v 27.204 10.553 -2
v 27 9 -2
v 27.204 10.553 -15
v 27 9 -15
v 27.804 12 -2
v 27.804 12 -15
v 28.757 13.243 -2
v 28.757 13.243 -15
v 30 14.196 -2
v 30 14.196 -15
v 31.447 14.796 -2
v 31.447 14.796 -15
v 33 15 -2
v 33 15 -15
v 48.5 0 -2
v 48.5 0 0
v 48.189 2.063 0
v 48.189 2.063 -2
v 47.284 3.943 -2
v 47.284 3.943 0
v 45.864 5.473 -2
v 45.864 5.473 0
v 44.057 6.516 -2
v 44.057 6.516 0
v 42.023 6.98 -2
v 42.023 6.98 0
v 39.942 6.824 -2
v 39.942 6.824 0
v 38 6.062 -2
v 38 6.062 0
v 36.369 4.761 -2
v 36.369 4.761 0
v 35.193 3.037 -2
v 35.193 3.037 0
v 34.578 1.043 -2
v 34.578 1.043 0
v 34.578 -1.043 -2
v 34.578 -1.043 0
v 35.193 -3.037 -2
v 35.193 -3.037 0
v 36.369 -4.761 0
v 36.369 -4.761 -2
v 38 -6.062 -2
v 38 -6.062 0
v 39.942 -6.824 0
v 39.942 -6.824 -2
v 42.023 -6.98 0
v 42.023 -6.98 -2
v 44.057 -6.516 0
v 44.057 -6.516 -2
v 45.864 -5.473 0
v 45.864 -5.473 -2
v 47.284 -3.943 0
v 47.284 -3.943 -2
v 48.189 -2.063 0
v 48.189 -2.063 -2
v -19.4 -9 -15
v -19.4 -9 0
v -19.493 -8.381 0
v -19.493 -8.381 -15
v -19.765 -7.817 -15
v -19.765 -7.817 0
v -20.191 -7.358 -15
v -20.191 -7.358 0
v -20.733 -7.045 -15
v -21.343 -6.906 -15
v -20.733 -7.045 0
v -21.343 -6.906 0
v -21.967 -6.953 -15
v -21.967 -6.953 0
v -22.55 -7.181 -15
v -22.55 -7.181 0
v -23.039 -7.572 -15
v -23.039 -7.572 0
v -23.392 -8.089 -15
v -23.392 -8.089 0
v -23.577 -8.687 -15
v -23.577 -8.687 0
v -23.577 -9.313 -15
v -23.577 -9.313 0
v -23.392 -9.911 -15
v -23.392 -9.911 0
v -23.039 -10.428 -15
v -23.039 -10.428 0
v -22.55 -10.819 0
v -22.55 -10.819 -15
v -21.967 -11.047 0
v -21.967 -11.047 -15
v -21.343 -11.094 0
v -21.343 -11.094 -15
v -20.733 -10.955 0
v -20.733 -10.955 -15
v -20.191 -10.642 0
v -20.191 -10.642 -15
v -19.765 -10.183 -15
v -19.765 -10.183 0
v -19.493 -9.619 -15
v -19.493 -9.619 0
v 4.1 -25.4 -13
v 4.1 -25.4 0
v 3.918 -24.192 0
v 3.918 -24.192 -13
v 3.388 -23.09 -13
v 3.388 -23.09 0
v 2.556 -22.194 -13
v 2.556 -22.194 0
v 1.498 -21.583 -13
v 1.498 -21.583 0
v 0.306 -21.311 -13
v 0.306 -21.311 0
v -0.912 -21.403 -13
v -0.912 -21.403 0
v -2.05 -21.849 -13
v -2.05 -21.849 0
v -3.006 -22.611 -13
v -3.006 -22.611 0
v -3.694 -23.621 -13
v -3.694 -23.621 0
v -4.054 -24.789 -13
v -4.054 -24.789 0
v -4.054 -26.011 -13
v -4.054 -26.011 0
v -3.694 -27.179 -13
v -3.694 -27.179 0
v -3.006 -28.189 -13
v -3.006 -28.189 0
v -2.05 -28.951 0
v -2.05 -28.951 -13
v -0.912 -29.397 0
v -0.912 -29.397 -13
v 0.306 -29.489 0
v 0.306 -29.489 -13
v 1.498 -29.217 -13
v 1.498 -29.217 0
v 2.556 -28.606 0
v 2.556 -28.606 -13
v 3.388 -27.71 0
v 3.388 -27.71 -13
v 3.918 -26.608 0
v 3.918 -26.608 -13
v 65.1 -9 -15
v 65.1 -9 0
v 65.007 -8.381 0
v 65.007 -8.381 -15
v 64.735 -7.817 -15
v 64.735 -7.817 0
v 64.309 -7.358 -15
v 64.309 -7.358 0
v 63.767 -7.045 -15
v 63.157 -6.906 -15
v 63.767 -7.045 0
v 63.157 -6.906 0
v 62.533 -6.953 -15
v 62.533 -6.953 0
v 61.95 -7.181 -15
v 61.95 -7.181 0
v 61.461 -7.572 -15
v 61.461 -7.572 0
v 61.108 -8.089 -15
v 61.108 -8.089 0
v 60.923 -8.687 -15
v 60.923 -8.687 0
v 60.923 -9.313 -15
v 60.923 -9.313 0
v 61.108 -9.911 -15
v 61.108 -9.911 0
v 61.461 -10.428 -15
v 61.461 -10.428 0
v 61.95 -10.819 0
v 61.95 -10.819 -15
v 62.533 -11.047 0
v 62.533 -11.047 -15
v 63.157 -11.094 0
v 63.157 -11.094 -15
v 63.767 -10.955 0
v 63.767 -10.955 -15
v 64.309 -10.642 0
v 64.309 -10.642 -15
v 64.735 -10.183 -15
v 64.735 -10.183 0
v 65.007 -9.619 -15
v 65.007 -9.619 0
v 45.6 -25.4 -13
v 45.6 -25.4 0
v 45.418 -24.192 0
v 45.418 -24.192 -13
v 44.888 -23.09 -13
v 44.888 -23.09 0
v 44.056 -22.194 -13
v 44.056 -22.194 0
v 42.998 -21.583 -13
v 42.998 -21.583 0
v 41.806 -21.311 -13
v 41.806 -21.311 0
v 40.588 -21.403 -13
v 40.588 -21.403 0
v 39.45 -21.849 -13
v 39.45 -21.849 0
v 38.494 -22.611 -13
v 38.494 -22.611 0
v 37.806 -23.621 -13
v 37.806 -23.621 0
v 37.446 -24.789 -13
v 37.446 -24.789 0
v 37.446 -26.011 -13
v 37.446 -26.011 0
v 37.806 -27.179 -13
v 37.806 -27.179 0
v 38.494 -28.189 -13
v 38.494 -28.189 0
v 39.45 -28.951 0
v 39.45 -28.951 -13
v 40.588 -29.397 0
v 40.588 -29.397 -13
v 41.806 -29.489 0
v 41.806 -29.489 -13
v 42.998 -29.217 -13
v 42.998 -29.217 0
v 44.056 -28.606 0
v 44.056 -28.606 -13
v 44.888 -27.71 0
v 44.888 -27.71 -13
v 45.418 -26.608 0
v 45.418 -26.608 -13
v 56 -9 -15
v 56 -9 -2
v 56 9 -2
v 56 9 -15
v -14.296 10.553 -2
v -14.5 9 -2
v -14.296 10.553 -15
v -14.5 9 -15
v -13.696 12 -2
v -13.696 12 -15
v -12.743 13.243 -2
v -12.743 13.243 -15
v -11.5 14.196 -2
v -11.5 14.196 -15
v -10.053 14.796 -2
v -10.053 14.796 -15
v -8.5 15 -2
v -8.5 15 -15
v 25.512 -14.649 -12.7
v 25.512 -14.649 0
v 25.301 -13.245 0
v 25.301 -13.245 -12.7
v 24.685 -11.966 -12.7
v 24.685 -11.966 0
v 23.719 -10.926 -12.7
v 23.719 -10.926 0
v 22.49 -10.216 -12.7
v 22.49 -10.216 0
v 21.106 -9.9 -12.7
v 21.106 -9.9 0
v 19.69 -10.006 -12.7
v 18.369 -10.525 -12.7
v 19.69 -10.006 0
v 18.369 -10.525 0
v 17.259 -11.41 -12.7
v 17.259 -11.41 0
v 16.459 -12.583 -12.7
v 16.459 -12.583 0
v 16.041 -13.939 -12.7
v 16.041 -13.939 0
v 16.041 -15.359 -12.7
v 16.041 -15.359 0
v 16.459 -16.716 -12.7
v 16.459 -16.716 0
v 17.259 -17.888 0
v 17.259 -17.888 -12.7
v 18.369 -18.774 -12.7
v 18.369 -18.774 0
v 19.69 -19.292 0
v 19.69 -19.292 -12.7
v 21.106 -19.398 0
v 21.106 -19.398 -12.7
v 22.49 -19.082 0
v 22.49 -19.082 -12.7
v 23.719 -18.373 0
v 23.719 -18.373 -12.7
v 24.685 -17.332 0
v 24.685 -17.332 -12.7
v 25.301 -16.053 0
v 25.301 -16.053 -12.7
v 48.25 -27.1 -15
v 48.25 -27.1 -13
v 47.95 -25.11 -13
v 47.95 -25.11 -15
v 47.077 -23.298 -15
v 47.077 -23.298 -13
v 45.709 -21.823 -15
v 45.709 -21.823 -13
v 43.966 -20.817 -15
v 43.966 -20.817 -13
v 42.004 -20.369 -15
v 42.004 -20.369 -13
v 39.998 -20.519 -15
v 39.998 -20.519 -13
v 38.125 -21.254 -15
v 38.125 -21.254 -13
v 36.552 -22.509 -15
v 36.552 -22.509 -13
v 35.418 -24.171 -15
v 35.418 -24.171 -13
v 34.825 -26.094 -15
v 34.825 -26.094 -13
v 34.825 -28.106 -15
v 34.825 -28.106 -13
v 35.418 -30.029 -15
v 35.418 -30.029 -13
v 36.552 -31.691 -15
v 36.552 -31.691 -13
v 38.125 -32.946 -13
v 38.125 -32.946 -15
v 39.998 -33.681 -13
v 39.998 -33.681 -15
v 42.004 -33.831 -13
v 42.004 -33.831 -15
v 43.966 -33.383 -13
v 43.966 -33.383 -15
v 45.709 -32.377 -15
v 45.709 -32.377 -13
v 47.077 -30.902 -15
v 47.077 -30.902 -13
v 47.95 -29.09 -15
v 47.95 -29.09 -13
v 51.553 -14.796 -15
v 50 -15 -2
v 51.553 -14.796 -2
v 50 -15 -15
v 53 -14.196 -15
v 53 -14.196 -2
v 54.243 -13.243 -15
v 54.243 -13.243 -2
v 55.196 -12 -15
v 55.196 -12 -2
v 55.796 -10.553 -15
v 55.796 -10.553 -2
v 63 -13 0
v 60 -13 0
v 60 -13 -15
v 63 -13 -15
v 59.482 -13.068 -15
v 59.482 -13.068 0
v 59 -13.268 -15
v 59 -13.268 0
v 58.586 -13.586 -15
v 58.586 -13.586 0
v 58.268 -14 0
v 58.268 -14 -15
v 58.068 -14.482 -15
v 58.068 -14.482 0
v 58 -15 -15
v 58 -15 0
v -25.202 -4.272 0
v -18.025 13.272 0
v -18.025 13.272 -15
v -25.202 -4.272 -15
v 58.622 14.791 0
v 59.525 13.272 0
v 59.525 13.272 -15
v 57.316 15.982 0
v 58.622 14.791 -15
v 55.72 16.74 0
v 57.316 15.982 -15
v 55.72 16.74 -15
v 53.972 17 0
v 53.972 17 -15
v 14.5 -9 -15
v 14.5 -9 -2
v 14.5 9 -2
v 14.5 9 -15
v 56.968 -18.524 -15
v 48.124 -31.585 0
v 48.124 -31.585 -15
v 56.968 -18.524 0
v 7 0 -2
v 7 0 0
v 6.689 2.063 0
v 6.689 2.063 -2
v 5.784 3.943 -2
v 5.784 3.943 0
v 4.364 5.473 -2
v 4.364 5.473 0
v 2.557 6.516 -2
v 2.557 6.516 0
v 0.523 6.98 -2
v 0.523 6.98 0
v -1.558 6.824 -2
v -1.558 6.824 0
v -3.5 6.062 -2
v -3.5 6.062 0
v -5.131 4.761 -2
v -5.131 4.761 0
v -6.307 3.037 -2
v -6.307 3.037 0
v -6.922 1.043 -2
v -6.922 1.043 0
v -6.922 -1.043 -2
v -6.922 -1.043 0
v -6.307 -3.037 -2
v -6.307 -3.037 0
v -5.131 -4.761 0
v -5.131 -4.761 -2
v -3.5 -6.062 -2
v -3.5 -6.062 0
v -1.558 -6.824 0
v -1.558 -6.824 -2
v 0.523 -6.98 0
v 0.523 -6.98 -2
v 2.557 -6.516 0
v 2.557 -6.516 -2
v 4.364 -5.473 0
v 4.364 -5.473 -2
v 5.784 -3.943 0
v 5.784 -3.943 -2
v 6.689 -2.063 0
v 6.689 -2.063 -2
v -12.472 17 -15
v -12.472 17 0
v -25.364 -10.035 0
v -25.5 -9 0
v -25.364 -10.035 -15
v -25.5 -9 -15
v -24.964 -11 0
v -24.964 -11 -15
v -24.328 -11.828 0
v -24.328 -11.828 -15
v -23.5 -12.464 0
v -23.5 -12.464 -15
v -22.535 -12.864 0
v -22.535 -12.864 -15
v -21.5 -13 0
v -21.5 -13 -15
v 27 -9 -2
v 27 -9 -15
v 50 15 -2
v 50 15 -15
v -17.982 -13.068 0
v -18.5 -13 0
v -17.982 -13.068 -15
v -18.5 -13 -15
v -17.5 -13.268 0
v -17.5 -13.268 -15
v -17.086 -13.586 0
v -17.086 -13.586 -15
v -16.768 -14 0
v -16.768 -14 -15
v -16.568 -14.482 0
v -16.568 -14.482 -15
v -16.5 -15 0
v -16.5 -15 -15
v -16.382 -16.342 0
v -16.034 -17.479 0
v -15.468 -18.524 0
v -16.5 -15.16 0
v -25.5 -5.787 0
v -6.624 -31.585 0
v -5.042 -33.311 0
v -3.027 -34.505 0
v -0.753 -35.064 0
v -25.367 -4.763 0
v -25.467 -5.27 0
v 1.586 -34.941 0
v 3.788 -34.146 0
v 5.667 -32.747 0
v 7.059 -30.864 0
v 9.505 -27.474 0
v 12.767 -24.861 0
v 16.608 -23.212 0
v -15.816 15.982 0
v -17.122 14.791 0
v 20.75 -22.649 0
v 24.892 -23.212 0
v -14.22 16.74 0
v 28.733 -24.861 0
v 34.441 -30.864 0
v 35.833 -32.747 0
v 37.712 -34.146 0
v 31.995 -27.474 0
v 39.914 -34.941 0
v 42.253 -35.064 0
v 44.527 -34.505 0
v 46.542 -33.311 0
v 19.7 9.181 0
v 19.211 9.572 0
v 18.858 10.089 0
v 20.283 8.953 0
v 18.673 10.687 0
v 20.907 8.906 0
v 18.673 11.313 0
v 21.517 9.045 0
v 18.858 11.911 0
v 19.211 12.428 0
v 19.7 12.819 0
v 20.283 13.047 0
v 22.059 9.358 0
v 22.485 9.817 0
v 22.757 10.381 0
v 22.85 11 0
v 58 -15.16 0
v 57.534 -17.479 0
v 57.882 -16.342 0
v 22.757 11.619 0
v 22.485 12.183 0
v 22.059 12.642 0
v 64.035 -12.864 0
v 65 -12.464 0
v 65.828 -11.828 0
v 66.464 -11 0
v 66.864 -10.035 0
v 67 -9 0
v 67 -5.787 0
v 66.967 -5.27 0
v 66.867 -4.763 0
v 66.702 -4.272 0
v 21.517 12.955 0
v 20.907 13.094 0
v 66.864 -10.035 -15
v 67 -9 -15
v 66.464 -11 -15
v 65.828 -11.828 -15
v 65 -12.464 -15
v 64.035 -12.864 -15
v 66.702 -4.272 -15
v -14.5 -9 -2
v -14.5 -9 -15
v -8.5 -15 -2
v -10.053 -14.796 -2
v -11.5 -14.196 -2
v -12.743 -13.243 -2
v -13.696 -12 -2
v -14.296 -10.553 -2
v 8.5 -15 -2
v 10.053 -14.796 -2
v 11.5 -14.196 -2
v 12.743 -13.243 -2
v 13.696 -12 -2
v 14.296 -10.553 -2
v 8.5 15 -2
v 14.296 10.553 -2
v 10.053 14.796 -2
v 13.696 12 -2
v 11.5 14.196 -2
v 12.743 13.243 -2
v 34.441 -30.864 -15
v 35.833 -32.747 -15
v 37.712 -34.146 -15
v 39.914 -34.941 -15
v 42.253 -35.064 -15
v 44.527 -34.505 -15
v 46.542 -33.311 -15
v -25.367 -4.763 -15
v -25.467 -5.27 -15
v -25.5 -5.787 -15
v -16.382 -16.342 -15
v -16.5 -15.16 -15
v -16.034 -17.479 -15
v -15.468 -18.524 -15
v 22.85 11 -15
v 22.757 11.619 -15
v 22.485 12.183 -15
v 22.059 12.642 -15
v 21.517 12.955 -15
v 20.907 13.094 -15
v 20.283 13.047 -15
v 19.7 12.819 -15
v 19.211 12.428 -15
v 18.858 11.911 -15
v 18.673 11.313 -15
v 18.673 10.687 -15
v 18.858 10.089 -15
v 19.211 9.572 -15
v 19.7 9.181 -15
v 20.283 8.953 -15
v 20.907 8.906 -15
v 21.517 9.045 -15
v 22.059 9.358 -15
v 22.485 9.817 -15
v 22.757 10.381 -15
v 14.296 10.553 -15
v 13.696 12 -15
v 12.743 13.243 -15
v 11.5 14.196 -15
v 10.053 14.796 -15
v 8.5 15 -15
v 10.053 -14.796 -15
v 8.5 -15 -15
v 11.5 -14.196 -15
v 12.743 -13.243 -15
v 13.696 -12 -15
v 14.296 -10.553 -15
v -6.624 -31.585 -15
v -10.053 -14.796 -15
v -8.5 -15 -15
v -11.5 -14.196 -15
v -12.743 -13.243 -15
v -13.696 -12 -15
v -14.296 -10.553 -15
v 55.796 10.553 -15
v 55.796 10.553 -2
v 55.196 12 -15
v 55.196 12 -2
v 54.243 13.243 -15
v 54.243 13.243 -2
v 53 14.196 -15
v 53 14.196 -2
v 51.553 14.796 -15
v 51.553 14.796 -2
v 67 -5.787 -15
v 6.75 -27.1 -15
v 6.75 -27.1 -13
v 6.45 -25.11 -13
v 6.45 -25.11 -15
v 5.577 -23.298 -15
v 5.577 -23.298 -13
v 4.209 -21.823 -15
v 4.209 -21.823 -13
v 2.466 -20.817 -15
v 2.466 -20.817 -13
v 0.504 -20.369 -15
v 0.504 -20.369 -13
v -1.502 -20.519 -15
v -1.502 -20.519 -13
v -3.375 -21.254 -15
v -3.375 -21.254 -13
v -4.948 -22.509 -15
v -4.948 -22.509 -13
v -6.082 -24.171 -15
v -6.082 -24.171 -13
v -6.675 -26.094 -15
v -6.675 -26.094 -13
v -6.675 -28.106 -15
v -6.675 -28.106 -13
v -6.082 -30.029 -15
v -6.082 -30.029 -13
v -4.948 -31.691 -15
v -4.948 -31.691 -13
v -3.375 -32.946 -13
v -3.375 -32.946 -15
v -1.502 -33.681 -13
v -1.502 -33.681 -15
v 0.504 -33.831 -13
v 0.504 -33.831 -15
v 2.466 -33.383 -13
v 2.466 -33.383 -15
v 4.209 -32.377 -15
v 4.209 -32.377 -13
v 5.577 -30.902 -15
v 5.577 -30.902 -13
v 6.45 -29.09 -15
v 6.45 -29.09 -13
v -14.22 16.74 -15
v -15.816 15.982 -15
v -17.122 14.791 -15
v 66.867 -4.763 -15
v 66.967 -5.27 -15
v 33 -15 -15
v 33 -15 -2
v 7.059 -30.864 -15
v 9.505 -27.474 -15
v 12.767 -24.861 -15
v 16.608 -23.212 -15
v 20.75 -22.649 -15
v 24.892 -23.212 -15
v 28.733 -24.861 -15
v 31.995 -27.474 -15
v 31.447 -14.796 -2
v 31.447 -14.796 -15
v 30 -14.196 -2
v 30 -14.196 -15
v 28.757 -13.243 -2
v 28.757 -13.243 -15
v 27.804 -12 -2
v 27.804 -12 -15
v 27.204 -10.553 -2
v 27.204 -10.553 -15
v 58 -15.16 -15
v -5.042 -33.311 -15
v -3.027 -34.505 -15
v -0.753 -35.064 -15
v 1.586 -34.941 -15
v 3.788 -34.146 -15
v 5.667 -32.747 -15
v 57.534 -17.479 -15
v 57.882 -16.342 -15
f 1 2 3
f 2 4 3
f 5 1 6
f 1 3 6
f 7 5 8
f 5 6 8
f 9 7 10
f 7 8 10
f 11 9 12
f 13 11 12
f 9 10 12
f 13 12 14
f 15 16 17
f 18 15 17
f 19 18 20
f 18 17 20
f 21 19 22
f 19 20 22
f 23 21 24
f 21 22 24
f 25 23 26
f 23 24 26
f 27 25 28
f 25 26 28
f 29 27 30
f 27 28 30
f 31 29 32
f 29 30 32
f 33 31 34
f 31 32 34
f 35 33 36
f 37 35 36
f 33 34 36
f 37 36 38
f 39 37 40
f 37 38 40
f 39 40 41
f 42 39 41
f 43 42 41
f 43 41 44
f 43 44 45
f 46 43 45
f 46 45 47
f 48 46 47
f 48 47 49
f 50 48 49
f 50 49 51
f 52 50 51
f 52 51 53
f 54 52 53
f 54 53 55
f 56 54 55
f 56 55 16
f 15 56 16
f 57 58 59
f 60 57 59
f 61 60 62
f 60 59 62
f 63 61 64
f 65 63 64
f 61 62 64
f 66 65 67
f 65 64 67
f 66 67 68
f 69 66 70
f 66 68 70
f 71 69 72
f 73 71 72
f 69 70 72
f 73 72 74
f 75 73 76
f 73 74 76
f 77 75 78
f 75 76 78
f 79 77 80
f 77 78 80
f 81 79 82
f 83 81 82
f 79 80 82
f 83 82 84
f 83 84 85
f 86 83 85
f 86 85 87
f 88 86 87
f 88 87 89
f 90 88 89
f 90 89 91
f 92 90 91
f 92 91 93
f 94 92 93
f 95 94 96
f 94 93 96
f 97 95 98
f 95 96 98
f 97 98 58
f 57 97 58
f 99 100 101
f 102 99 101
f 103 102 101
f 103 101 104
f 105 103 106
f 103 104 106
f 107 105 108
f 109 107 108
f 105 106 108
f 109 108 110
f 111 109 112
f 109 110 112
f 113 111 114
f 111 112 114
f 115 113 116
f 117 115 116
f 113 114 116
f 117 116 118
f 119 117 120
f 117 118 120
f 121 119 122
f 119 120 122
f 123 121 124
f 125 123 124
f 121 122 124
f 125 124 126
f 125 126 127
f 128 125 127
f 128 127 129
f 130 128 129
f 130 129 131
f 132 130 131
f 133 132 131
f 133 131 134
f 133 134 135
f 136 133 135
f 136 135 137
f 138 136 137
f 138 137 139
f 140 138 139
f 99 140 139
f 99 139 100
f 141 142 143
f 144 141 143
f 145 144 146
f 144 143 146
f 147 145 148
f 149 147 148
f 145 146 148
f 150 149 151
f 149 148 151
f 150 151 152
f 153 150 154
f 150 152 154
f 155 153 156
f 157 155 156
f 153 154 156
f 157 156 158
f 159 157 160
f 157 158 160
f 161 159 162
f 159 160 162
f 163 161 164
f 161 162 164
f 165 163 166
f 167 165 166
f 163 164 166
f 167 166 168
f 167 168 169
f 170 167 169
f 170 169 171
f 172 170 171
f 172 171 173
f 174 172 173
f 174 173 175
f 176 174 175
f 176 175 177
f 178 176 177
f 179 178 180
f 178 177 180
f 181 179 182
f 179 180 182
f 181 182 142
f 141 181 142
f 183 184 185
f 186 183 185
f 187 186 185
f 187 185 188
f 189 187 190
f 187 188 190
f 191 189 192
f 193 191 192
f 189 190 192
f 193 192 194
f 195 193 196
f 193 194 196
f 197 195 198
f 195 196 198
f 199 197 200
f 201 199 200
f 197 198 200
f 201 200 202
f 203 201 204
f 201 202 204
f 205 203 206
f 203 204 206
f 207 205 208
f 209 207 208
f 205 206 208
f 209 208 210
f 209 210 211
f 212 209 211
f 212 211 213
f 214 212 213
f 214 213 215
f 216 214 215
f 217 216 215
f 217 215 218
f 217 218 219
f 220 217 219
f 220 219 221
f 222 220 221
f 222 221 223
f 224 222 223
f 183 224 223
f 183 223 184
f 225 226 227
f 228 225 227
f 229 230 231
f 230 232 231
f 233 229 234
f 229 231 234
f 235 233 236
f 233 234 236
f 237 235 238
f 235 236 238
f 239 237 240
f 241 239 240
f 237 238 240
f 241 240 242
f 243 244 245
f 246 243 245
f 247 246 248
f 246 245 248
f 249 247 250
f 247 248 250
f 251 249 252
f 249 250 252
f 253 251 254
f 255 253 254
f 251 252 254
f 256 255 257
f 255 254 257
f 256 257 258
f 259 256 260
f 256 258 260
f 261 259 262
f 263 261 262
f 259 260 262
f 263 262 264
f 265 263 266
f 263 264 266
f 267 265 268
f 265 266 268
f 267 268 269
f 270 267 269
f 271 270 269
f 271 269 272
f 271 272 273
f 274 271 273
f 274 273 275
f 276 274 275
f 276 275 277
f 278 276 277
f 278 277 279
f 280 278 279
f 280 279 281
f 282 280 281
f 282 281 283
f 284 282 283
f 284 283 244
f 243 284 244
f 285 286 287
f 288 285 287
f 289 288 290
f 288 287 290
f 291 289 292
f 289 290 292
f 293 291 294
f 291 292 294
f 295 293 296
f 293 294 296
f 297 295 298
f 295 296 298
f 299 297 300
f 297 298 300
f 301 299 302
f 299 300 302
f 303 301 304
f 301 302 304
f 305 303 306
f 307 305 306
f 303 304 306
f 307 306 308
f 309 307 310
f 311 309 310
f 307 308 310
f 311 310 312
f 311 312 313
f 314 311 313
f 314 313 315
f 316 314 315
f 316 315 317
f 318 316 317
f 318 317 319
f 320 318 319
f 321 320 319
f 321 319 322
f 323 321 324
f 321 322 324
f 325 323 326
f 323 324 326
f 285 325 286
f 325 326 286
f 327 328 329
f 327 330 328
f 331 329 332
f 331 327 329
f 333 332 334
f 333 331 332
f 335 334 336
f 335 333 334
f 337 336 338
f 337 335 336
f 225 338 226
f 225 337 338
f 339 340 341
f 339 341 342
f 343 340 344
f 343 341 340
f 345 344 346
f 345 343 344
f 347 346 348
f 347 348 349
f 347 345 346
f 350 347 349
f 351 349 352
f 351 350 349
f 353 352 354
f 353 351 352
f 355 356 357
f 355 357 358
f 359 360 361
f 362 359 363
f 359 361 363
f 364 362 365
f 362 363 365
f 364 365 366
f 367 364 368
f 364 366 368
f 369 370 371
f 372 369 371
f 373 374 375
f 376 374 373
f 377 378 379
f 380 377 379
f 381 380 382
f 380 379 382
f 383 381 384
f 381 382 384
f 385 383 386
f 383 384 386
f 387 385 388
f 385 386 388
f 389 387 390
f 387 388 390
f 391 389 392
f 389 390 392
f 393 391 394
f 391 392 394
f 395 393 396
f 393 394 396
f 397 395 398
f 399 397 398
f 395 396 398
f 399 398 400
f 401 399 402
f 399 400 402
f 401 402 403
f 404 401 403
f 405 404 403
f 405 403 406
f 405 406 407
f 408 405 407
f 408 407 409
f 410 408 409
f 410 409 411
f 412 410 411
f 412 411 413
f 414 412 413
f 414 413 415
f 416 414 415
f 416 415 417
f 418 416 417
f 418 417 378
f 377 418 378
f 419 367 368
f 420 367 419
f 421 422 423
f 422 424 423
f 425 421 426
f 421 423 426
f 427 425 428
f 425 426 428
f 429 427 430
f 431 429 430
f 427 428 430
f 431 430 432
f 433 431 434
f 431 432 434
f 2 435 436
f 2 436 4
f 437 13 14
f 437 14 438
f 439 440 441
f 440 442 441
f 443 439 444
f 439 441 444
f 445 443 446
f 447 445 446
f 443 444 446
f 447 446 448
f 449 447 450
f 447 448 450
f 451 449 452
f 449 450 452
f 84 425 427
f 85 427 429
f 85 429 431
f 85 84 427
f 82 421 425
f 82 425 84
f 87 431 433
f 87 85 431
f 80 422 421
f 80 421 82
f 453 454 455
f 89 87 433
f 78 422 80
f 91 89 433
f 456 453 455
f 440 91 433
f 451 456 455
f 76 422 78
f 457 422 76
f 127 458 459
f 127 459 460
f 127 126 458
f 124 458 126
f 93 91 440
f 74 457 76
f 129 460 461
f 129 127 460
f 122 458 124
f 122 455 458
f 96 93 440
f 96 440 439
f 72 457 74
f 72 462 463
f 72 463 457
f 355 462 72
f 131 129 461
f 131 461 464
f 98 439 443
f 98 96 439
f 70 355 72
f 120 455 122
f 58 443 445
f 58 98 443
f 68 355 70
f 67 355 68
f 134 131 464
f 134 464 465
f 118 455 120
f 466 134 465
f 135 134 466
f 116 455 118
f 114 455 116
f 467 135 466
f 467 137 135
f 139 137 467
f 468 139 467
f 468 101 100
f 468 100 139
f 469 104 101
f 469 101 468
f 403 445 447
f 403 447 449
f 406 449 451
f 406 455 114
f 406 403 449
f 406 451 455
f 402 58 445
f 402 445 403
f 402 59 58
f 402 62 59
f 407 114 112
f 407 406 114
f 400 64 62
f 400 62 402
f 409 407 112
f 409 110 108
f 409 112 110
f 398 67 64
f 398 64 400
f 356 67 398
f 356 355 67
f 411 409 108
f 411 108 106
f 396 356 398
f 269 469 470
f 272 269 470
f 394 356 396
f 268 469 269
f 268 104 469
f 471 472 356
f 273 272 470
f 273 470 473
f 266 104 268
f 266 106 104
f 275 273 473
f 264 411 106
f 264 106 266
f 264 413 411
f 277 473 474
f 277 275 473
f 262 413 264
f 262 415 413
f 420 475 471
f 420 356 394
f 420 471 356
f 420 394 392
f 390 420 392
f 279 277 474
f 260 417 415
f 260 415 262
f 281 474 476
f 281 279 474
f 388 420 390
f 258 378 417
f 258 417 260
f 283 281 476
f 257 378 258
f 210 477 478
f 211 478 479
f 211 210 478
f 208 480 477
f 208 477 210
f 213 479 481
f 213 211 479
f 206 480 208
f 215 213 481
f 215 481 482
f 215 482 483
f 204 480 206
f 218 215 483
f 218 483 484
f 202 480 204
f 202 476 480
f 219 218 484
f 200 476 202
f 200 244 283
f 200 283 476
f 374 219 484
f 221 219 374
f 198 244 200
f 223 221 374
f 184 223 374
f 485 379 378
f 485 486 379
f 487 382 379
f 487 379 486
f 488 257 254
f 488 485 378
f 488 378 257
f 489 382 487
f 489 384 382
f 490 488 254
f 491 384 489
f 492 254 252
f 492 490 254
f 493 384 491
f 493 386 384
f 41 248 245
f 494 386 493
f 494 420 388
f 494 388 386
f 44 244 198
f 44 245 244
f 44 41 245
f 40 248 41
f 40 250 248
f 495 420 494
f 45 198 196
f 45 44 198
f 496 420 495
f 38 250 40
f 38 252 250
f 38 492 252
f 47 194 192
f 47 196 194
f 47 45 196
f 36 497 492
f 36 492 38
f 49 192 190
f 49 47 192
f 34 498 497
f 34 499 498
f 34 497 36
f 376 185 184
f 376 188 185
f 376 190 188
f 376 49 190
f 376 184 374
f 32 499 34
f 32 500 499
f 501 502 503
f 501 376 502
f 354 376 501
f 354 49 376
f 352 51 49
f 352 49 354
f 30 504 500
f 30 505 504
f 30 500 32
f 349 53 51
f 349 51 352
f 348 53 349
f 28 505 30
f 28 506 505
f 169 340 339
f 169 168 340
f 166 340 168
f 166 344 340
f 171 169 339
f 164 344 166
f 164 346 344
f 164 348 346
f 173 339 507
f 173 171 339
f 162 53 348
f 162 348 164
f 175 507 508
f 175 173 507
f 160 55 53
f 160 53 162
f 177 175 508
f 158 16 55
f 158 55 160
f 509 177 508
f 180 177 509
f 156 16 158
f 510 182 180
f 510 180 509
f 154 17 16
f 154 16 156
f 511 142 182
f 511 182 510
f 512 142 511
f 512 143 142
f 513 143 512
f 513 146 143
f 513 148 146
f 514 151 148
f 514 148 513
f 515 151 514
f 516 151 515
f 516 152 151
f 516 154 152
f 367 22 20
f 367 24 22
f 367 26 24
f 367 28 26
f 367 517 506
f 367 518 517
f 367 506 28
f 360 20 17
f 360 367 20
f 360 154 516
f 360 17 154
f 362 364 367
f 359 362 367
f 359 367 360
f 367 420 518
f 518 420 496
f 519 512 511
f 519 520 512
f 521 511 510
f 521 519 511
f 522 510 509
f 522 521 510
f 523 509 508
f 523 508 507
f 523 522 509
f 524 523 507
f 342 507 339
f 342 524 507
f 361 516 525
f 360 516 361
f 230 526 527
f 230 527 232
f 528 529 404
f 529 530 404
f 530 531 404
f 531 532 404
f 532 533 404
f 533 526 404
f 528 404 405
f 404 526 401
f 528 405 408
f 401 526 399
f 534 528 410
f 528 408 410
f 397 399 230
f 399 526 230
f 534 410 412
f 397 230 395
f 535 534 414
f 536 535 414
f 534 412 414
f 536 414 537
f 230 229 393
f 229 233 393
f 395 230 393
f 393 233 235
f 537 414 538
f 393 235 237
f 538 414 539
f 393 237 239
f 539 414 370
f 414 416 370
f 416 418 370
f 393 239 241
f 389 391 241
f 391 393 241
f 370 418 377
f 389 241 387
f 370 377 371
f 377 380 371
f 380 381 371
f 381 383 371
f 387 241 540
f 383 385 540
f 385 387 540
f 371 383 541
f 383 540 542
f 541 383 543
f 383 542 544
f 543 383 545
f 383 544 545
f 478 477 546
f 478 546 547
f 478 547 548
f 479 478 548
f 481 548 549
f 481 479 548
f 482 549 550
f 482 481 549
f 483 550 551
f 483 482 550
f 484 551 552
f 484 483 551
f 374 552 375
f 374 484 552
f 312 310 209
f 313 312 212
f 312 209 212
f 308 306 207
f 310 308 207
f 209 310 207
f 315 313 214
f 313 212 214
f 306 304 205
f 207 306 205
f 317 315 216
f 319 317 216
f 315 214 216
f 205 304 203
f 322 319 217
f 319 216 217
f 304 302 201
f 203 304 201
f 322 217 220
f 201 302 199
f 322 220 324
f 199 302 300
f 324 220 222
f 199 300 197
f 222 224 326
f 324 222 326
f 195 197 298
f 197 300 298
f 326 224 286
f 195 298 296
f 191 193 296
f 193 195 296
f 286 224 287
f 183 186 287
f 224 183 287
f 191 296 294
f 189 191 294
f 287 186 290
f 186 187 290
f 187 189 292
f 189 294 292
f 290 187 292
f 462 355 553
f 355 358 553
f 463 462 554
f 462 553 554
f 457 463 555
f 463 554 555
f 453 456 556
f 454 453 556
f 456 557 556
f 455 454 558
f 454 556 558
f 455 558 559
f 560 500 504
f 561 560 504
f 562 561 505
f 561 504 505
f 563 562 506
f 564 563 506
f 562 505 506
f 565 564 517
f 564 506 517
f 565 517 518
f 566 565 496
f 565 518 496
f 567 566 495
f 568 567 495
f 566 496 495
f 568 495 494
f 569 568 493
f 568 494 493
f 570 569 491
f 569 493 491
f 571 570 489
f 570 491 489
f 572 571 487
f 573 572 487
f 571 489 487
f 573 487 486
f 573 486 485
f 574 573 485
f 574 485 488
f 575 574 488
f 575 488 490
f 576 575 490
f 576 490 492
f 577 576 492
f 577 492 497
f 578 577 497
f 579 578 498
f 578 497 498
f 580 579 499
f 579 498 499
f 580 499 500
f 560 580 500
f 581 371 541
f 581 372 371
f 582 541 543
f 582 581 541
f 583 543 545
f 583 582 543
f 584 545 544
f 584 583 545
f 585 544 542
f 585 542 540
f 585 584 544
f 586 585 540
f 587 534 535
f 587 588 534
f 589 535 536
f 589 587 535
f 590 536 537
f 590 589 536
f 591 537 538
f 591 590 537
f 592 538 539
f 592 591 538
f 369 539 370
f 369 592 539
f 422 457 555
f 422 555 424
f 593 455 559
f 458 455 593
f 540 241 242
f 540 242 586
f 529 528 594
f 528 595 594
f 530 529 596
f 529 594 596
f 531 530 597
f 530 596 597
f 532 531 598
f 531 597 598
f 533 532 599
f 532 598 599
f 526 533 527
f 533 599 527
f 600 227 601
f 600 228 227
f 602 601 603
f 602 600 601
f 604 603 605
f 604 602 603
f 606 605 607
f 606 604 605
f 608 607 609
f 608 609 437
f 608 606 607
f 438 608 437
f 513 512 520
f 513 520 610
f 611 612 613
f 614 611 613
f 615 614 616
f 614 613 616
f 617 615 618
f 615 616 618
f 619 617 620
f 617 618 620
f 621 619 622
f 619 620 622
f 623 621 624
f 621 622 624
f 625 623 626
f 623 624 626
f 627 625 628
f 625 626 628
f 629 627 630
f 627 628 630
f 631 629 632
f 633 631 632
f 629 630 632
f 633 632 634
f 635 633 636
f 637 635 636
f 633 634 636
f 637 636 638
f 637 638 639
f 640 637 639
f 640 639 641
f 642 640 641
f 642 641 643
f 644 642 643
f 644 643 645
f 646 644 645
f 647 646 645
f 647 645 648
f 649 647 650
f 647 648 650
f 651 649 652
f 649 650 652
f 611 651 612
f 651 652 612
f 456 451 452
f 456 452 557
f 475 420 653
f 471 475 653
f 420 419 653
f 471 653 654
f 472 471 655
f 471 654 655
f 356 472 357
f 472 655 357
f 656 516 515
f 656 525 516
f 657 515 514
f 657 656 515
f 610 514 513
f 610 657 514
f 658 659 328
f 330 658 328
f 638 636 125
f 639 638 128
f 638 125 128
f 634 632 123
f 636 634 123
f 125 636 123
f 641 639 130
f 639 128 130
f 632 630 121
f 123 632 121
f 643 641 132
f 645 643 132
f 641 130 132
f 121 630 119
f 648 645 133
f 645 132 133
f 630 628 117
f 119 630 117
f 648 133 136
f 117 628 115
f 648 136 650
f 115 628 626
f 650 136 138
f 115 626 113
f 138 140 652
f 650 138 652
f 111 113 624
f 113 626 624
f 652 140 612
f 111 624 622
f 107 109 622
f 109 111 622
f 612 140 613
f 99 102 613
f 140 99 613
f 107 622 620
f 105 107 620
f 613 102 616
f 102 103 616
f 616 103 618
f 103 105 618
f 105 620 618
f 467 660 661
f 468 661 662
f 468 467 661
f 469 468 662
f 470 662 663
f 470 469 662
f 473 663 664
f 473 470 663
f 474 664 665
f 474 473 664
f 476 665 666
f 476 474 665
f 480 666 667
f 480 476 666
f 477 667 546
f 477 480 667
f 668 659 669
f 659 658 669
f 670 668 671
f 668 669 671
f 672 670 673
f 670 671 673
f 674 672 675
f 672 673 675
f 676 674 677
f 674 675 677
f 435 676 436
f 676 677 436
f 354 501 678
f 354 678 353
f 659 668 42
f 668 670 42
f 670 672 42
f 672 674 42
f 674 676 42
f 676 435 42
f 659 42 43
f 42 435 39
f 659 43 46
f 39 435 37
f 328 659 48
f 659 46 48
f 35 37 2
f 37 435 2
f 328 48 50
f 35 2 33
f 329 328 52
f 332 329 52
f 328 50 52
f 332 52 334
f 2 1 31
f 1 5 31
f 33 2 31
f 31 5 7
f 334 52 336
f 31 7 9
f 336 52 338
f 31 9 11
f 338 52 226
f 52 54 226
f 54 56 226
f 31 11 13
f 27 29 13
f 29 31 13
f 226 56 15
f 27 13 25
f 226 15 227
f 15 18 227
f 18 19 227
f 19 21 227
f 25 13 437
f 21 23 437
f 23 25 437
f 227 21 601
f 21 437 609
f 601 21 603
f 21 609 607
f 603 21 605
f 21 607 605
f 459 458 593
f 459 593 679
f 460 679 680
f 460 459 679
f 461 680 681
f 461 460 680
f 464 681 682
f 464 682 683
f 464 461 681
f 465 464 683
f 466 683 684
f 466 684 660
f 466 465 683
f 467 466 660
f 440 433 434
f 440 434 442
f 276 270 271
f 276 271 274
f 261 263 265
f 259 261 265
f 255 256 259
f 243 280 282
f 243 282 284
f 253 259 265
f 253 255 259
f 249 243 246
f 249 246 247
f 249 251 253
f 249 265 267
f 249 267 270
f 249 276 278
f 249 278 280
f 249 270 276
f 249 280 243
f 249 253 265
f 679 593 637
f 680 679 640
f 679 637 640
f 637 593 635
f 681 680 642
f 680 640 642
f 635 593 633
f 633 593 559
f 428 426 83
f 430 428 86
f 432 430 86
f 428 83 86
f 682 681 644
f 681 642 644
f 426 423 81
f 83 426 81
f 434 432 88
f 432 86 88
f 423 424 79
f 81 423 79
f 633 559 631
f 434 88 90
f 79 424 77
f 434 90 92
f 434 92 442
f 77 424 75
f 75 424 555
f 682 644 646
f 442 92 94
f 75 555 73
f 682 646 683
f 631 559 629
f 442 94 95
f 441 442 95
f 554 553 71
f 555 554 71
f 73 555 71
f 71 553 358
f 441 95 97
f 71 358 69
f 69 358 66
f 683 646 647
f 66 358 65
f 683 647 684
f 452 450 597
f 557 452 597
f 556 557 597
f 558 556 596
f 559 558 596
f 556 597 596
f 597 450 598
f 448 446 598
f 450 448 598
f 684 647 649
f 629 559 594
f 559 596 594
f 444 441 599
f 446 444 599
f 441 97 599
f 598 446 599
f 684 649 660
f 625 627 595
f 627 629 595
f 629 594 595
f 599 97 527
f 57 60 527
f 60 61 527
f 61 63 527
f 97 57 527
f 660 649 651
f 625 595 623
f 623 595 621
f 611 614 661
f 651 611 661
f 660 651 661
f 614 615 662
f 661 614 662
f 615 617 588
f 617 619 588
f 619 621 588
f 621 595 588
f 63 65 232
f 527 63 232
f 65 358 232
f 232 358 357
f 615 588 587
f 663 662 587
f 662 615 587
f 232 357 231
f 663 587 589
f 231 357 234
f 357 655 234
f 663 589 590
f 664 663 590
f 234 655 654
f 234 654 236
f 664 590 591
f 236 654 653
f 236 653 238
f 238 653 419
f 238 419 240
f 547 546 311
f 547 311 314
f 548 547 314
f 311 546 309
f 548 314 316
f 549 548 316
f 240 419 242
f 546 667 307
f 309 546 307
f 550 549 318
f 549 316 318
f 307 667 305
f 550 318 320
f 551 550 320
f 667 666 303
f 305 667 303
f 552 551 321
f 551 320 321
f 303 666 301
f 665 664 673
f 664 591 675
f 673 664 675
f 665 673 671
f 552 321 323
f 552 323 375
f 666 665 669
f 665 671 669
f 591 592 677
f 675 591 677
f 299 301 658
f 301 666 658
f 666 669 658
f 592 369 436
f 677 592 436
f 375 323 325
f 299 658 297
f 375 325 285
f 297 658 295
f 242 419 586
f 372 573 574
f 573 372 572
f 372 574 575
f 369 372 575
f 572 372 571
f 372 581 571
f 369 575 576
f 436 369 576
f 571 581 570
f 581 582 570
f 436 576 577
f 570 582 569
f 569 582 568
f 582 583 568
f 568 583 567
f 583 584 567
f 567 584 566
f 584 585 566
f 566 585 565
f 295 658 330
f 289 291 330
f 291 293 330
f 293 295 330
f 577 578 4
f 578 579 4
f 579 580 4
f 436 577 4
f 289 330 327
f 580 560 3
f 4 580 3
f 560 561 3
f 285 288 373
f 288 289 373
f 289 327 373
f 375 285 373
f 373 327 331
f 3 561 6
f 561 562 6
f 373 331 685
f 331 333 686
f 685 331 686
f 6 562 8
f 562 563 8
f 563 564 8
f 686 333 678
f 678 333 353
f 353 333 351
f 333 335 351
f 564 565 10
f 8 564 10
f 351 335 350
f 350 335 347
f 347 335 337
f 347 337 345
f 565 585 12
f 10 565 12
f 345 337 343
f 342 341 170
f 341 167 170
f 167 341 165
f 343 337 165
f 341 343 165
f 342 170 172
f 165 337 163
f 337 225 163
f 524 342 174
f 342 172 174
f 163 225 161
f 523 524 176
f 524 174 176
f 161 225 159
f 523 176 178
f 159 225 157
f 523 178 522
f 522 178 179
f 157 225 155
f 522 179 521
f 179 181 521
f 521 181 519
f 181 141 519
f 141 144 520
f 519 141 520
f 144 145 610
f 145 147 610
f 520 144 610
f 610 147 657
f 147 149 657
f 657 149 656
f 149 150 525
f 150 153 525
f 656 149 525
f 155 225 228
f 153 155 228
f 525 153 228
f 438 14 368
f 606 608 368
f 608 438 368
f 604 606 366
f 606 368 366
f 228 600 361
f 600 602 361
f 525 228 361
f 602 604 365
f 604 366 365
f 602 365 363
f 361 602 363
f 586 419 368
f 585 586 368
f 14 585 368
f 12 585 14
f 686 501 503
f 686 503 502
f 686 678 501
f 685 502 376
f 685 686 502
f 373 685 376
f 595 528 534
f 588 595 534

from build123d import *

# Parameters (mm, degrees)
SKETCH5_R           = 7
SKETCH5_R_2         = 4.7625
SKETCH5_R_3         = 2.1
SKETCH5_R_4         = 4.1
BOSS_EXTRUDE5_DEPTH = 15
CUT_EXTRUDE1_START  = -2
SKETCH1_W           = 29
SKETCH1_H           = 30
SKETCH1_R           = 7
CUT_EXTRUDE1_DEPTH  = 13
CUT_EXTRUDE2_START  = -13
SKETCH5_3_R         = 6.75
SKETCH5_3_R_2       = 4.1
CUT_EXTRUDE2_DEPTH  = 2
FILLET1_R           = 6
FILLET2_R           = 4
FILLET3_R           = 6
FILLET4_R           = 2
BOSS_EXTRUDE6_START = -12.7
SKETCH5_4_R         = 4.7625
BOSS_EXTRUDE6_DEPTH = 2.3


with BuildPart() as part:
    # Sketch5 → Boss-Extrude5 (new body)
    with BuildSketch(Plane.XY):
        with BuildLine():
            Line((58, 17), (-16.5, 17))
            Line((-16.5, 17), (-25.5, -5))
            Line((-25.5, -5), (-25.5, -13))
            Line((-25.5, -13), (-16.5, -13))
            Line((-16.5, -13), (-16.5, -17))
            Line((-16.5, -17), (-6.624344746, -31.585315674))
            ThreePointArc((-6.624344746, -31.585315674), (0.420970348, -35.08891632), (7.059051341, -30.864278705))
            ThreePointArc((7.059051341, -30.864278705), (20.750000185, -22.649146733), (34.440948834, -30.864279032))
            ThreePointArc((34.440948834, -30.864279032), (41.079029838, -35.08891633), (48.124344746, -31.585315674))
            Line((48.124344746, -31.585315674), (58, -17))
            Line((58, -17), (58, -13))
            Line((58, -13), (67, -13))
            Line((67, -13), (67, -5))
            Line((67, -5), (58, 17))
        make_face()
        Circle(SKETCH5_R, mode=Mode.SUBTRACT)
        with Locations((20.75, -14.649146733)):
            Circle(SKETCH5_R_2, mode=Mode.SUBTRACT)
        with Locations((41.5, 0)):
            Circle(SKETCH5_R, mode=Mode.SUBTRACT)
        with Locations((20.75, 11)):
            Circle(SKETCH5_R_3, mode=Mode.SUBTRACT)
        with Locations((-21.5, -9)):
            Circle(SKETCH5_R_3, mode=Mode.SUBTRACT)
        with Locations((63, -9)):
            Circle(SKETCH5_R_3, mode=Mode.SUBTRACT)
        with Locations((41.5, -25.4)):
            Circle(SKETCH5_R_4, mode=Mode.SUBTRACT)
        with Locations((0, -25.4)):
            Circle(SKETCH5_R_4, mode=Mode.SUBTRACT)
    extrude(amount=-BOSS_EXTRUDE5_DEPTH)

    # Sketch1 → Cut-Extrude1 (cut)
    # profile 1 of 2: a face of its own
    with BuildSketch(Plane.XY.offset(CUT_EXTRUDE1_START)):
        Rectangle(SKETCH1_W, SKETCH1_H)
        Circle(SKETCH1_R, mode=Mode.SUBTRACT)
    # profile 2 of 2: a face of its own
    with BuildSketch(Plane.XY.offset(CUT_EXTRUDE1_START)):
        with Locations((41.5, 0)):
            Rectangle(SKETCH1_W, SKETCH1_H)
        with Locations((41.5, 0)):
            Circle(SKETCH1_R, mode=Mode.SUBTRACT)
    extrude(amount=-CUT_EXTRUDE1_DEPTH, mode=Mode.SUBTRACT)

    # Sketch5<3> → Cut-Extrude2 (cut)
    # profile 1 of 2: a face of its own
    with BuildSketch(Plane.XY.offset(CUT_EXTRUDE2_START)):
        with Locations((41.5, -27.1)):
            Circle(SKETCH5_3_R)
        with Locations((41.5, -25.4)):
            Circle(SKETCH5_3_R_2, mode=Mode.SUBTRACT)
    # profile 2 of 2: a face of its own
    with BuildSketch(Plane.XY.offset(CUT_EXTRUDE2_START)):
        with Locations((0, -27.1)):
            Circle(SKETCH5_3_R)
        with Locations((0, -25.4)):
            Circle(SKETCH5_3_R_2, mode=Mode.SUBTRACT)
    extrude(amount=-CUT_EXTRUDE2_DEPTH, mode=Mode.SUBTRACT)

    # Fillet1
    fillet1_edges = [part.edges().sort_by_distance(p)[0] for p in [
        (-14.5, -15, -8.5),
        (14.5, -15, -8.5),
        (14.5, 15, -8.5),
        (-14.5, 15, -8.5),
        (27, -15, -8.5),
        (56, -15, -8.5),
        (56, 15, -8.5),
        (27, 15, -8.5),
    ]]
    fillet(fillet1_edges, radius=FILLET1_R)

    # Fillet2
    fillet2_edges = [part.edges().sort_by_distance(p)[0] for p in [
        (67, -13, -7.5),
        (-25.5, -13, -7.5),
        (-25.5, -5, -7.5),
        (67, -5, -7.5),
    ]]
    fillet(fillet2_edges, radius=FILLET2_R)

    # Fillet3
    fillet3_edges = [part.edges().sort_by_distance(p)[0] for p in [
        (58, -17, -7.5),
        (-16.5, -17, -7.5),
        (-16.5, 17, -7.5),
        (58, 17, -7.5),
    ]]
    fillet(fillet3_edges, radius=FILLET3_R)

    # Fillet4
    fillet4_edges = [part.edges().sort_by_distance(p)[0] for p in [
        (58, -13, -7.5),
        (-16.5, -13, -7.5),
    ]]
    fillet(fillet4_edges, radius=FILLET4_R)

    # Sketch5<4> → Boss-Extrude6 (add)
    with BuildSketch(Plane.XY.offset(BOSS_EXTRUDE6_START)):
        with Locations((20.75, -14.649146733)):
            Circle(SKETCH5_4_R)
    extrude(amount=-BOSS_EXTRUDE6_DEPTH)


solid = part.part
